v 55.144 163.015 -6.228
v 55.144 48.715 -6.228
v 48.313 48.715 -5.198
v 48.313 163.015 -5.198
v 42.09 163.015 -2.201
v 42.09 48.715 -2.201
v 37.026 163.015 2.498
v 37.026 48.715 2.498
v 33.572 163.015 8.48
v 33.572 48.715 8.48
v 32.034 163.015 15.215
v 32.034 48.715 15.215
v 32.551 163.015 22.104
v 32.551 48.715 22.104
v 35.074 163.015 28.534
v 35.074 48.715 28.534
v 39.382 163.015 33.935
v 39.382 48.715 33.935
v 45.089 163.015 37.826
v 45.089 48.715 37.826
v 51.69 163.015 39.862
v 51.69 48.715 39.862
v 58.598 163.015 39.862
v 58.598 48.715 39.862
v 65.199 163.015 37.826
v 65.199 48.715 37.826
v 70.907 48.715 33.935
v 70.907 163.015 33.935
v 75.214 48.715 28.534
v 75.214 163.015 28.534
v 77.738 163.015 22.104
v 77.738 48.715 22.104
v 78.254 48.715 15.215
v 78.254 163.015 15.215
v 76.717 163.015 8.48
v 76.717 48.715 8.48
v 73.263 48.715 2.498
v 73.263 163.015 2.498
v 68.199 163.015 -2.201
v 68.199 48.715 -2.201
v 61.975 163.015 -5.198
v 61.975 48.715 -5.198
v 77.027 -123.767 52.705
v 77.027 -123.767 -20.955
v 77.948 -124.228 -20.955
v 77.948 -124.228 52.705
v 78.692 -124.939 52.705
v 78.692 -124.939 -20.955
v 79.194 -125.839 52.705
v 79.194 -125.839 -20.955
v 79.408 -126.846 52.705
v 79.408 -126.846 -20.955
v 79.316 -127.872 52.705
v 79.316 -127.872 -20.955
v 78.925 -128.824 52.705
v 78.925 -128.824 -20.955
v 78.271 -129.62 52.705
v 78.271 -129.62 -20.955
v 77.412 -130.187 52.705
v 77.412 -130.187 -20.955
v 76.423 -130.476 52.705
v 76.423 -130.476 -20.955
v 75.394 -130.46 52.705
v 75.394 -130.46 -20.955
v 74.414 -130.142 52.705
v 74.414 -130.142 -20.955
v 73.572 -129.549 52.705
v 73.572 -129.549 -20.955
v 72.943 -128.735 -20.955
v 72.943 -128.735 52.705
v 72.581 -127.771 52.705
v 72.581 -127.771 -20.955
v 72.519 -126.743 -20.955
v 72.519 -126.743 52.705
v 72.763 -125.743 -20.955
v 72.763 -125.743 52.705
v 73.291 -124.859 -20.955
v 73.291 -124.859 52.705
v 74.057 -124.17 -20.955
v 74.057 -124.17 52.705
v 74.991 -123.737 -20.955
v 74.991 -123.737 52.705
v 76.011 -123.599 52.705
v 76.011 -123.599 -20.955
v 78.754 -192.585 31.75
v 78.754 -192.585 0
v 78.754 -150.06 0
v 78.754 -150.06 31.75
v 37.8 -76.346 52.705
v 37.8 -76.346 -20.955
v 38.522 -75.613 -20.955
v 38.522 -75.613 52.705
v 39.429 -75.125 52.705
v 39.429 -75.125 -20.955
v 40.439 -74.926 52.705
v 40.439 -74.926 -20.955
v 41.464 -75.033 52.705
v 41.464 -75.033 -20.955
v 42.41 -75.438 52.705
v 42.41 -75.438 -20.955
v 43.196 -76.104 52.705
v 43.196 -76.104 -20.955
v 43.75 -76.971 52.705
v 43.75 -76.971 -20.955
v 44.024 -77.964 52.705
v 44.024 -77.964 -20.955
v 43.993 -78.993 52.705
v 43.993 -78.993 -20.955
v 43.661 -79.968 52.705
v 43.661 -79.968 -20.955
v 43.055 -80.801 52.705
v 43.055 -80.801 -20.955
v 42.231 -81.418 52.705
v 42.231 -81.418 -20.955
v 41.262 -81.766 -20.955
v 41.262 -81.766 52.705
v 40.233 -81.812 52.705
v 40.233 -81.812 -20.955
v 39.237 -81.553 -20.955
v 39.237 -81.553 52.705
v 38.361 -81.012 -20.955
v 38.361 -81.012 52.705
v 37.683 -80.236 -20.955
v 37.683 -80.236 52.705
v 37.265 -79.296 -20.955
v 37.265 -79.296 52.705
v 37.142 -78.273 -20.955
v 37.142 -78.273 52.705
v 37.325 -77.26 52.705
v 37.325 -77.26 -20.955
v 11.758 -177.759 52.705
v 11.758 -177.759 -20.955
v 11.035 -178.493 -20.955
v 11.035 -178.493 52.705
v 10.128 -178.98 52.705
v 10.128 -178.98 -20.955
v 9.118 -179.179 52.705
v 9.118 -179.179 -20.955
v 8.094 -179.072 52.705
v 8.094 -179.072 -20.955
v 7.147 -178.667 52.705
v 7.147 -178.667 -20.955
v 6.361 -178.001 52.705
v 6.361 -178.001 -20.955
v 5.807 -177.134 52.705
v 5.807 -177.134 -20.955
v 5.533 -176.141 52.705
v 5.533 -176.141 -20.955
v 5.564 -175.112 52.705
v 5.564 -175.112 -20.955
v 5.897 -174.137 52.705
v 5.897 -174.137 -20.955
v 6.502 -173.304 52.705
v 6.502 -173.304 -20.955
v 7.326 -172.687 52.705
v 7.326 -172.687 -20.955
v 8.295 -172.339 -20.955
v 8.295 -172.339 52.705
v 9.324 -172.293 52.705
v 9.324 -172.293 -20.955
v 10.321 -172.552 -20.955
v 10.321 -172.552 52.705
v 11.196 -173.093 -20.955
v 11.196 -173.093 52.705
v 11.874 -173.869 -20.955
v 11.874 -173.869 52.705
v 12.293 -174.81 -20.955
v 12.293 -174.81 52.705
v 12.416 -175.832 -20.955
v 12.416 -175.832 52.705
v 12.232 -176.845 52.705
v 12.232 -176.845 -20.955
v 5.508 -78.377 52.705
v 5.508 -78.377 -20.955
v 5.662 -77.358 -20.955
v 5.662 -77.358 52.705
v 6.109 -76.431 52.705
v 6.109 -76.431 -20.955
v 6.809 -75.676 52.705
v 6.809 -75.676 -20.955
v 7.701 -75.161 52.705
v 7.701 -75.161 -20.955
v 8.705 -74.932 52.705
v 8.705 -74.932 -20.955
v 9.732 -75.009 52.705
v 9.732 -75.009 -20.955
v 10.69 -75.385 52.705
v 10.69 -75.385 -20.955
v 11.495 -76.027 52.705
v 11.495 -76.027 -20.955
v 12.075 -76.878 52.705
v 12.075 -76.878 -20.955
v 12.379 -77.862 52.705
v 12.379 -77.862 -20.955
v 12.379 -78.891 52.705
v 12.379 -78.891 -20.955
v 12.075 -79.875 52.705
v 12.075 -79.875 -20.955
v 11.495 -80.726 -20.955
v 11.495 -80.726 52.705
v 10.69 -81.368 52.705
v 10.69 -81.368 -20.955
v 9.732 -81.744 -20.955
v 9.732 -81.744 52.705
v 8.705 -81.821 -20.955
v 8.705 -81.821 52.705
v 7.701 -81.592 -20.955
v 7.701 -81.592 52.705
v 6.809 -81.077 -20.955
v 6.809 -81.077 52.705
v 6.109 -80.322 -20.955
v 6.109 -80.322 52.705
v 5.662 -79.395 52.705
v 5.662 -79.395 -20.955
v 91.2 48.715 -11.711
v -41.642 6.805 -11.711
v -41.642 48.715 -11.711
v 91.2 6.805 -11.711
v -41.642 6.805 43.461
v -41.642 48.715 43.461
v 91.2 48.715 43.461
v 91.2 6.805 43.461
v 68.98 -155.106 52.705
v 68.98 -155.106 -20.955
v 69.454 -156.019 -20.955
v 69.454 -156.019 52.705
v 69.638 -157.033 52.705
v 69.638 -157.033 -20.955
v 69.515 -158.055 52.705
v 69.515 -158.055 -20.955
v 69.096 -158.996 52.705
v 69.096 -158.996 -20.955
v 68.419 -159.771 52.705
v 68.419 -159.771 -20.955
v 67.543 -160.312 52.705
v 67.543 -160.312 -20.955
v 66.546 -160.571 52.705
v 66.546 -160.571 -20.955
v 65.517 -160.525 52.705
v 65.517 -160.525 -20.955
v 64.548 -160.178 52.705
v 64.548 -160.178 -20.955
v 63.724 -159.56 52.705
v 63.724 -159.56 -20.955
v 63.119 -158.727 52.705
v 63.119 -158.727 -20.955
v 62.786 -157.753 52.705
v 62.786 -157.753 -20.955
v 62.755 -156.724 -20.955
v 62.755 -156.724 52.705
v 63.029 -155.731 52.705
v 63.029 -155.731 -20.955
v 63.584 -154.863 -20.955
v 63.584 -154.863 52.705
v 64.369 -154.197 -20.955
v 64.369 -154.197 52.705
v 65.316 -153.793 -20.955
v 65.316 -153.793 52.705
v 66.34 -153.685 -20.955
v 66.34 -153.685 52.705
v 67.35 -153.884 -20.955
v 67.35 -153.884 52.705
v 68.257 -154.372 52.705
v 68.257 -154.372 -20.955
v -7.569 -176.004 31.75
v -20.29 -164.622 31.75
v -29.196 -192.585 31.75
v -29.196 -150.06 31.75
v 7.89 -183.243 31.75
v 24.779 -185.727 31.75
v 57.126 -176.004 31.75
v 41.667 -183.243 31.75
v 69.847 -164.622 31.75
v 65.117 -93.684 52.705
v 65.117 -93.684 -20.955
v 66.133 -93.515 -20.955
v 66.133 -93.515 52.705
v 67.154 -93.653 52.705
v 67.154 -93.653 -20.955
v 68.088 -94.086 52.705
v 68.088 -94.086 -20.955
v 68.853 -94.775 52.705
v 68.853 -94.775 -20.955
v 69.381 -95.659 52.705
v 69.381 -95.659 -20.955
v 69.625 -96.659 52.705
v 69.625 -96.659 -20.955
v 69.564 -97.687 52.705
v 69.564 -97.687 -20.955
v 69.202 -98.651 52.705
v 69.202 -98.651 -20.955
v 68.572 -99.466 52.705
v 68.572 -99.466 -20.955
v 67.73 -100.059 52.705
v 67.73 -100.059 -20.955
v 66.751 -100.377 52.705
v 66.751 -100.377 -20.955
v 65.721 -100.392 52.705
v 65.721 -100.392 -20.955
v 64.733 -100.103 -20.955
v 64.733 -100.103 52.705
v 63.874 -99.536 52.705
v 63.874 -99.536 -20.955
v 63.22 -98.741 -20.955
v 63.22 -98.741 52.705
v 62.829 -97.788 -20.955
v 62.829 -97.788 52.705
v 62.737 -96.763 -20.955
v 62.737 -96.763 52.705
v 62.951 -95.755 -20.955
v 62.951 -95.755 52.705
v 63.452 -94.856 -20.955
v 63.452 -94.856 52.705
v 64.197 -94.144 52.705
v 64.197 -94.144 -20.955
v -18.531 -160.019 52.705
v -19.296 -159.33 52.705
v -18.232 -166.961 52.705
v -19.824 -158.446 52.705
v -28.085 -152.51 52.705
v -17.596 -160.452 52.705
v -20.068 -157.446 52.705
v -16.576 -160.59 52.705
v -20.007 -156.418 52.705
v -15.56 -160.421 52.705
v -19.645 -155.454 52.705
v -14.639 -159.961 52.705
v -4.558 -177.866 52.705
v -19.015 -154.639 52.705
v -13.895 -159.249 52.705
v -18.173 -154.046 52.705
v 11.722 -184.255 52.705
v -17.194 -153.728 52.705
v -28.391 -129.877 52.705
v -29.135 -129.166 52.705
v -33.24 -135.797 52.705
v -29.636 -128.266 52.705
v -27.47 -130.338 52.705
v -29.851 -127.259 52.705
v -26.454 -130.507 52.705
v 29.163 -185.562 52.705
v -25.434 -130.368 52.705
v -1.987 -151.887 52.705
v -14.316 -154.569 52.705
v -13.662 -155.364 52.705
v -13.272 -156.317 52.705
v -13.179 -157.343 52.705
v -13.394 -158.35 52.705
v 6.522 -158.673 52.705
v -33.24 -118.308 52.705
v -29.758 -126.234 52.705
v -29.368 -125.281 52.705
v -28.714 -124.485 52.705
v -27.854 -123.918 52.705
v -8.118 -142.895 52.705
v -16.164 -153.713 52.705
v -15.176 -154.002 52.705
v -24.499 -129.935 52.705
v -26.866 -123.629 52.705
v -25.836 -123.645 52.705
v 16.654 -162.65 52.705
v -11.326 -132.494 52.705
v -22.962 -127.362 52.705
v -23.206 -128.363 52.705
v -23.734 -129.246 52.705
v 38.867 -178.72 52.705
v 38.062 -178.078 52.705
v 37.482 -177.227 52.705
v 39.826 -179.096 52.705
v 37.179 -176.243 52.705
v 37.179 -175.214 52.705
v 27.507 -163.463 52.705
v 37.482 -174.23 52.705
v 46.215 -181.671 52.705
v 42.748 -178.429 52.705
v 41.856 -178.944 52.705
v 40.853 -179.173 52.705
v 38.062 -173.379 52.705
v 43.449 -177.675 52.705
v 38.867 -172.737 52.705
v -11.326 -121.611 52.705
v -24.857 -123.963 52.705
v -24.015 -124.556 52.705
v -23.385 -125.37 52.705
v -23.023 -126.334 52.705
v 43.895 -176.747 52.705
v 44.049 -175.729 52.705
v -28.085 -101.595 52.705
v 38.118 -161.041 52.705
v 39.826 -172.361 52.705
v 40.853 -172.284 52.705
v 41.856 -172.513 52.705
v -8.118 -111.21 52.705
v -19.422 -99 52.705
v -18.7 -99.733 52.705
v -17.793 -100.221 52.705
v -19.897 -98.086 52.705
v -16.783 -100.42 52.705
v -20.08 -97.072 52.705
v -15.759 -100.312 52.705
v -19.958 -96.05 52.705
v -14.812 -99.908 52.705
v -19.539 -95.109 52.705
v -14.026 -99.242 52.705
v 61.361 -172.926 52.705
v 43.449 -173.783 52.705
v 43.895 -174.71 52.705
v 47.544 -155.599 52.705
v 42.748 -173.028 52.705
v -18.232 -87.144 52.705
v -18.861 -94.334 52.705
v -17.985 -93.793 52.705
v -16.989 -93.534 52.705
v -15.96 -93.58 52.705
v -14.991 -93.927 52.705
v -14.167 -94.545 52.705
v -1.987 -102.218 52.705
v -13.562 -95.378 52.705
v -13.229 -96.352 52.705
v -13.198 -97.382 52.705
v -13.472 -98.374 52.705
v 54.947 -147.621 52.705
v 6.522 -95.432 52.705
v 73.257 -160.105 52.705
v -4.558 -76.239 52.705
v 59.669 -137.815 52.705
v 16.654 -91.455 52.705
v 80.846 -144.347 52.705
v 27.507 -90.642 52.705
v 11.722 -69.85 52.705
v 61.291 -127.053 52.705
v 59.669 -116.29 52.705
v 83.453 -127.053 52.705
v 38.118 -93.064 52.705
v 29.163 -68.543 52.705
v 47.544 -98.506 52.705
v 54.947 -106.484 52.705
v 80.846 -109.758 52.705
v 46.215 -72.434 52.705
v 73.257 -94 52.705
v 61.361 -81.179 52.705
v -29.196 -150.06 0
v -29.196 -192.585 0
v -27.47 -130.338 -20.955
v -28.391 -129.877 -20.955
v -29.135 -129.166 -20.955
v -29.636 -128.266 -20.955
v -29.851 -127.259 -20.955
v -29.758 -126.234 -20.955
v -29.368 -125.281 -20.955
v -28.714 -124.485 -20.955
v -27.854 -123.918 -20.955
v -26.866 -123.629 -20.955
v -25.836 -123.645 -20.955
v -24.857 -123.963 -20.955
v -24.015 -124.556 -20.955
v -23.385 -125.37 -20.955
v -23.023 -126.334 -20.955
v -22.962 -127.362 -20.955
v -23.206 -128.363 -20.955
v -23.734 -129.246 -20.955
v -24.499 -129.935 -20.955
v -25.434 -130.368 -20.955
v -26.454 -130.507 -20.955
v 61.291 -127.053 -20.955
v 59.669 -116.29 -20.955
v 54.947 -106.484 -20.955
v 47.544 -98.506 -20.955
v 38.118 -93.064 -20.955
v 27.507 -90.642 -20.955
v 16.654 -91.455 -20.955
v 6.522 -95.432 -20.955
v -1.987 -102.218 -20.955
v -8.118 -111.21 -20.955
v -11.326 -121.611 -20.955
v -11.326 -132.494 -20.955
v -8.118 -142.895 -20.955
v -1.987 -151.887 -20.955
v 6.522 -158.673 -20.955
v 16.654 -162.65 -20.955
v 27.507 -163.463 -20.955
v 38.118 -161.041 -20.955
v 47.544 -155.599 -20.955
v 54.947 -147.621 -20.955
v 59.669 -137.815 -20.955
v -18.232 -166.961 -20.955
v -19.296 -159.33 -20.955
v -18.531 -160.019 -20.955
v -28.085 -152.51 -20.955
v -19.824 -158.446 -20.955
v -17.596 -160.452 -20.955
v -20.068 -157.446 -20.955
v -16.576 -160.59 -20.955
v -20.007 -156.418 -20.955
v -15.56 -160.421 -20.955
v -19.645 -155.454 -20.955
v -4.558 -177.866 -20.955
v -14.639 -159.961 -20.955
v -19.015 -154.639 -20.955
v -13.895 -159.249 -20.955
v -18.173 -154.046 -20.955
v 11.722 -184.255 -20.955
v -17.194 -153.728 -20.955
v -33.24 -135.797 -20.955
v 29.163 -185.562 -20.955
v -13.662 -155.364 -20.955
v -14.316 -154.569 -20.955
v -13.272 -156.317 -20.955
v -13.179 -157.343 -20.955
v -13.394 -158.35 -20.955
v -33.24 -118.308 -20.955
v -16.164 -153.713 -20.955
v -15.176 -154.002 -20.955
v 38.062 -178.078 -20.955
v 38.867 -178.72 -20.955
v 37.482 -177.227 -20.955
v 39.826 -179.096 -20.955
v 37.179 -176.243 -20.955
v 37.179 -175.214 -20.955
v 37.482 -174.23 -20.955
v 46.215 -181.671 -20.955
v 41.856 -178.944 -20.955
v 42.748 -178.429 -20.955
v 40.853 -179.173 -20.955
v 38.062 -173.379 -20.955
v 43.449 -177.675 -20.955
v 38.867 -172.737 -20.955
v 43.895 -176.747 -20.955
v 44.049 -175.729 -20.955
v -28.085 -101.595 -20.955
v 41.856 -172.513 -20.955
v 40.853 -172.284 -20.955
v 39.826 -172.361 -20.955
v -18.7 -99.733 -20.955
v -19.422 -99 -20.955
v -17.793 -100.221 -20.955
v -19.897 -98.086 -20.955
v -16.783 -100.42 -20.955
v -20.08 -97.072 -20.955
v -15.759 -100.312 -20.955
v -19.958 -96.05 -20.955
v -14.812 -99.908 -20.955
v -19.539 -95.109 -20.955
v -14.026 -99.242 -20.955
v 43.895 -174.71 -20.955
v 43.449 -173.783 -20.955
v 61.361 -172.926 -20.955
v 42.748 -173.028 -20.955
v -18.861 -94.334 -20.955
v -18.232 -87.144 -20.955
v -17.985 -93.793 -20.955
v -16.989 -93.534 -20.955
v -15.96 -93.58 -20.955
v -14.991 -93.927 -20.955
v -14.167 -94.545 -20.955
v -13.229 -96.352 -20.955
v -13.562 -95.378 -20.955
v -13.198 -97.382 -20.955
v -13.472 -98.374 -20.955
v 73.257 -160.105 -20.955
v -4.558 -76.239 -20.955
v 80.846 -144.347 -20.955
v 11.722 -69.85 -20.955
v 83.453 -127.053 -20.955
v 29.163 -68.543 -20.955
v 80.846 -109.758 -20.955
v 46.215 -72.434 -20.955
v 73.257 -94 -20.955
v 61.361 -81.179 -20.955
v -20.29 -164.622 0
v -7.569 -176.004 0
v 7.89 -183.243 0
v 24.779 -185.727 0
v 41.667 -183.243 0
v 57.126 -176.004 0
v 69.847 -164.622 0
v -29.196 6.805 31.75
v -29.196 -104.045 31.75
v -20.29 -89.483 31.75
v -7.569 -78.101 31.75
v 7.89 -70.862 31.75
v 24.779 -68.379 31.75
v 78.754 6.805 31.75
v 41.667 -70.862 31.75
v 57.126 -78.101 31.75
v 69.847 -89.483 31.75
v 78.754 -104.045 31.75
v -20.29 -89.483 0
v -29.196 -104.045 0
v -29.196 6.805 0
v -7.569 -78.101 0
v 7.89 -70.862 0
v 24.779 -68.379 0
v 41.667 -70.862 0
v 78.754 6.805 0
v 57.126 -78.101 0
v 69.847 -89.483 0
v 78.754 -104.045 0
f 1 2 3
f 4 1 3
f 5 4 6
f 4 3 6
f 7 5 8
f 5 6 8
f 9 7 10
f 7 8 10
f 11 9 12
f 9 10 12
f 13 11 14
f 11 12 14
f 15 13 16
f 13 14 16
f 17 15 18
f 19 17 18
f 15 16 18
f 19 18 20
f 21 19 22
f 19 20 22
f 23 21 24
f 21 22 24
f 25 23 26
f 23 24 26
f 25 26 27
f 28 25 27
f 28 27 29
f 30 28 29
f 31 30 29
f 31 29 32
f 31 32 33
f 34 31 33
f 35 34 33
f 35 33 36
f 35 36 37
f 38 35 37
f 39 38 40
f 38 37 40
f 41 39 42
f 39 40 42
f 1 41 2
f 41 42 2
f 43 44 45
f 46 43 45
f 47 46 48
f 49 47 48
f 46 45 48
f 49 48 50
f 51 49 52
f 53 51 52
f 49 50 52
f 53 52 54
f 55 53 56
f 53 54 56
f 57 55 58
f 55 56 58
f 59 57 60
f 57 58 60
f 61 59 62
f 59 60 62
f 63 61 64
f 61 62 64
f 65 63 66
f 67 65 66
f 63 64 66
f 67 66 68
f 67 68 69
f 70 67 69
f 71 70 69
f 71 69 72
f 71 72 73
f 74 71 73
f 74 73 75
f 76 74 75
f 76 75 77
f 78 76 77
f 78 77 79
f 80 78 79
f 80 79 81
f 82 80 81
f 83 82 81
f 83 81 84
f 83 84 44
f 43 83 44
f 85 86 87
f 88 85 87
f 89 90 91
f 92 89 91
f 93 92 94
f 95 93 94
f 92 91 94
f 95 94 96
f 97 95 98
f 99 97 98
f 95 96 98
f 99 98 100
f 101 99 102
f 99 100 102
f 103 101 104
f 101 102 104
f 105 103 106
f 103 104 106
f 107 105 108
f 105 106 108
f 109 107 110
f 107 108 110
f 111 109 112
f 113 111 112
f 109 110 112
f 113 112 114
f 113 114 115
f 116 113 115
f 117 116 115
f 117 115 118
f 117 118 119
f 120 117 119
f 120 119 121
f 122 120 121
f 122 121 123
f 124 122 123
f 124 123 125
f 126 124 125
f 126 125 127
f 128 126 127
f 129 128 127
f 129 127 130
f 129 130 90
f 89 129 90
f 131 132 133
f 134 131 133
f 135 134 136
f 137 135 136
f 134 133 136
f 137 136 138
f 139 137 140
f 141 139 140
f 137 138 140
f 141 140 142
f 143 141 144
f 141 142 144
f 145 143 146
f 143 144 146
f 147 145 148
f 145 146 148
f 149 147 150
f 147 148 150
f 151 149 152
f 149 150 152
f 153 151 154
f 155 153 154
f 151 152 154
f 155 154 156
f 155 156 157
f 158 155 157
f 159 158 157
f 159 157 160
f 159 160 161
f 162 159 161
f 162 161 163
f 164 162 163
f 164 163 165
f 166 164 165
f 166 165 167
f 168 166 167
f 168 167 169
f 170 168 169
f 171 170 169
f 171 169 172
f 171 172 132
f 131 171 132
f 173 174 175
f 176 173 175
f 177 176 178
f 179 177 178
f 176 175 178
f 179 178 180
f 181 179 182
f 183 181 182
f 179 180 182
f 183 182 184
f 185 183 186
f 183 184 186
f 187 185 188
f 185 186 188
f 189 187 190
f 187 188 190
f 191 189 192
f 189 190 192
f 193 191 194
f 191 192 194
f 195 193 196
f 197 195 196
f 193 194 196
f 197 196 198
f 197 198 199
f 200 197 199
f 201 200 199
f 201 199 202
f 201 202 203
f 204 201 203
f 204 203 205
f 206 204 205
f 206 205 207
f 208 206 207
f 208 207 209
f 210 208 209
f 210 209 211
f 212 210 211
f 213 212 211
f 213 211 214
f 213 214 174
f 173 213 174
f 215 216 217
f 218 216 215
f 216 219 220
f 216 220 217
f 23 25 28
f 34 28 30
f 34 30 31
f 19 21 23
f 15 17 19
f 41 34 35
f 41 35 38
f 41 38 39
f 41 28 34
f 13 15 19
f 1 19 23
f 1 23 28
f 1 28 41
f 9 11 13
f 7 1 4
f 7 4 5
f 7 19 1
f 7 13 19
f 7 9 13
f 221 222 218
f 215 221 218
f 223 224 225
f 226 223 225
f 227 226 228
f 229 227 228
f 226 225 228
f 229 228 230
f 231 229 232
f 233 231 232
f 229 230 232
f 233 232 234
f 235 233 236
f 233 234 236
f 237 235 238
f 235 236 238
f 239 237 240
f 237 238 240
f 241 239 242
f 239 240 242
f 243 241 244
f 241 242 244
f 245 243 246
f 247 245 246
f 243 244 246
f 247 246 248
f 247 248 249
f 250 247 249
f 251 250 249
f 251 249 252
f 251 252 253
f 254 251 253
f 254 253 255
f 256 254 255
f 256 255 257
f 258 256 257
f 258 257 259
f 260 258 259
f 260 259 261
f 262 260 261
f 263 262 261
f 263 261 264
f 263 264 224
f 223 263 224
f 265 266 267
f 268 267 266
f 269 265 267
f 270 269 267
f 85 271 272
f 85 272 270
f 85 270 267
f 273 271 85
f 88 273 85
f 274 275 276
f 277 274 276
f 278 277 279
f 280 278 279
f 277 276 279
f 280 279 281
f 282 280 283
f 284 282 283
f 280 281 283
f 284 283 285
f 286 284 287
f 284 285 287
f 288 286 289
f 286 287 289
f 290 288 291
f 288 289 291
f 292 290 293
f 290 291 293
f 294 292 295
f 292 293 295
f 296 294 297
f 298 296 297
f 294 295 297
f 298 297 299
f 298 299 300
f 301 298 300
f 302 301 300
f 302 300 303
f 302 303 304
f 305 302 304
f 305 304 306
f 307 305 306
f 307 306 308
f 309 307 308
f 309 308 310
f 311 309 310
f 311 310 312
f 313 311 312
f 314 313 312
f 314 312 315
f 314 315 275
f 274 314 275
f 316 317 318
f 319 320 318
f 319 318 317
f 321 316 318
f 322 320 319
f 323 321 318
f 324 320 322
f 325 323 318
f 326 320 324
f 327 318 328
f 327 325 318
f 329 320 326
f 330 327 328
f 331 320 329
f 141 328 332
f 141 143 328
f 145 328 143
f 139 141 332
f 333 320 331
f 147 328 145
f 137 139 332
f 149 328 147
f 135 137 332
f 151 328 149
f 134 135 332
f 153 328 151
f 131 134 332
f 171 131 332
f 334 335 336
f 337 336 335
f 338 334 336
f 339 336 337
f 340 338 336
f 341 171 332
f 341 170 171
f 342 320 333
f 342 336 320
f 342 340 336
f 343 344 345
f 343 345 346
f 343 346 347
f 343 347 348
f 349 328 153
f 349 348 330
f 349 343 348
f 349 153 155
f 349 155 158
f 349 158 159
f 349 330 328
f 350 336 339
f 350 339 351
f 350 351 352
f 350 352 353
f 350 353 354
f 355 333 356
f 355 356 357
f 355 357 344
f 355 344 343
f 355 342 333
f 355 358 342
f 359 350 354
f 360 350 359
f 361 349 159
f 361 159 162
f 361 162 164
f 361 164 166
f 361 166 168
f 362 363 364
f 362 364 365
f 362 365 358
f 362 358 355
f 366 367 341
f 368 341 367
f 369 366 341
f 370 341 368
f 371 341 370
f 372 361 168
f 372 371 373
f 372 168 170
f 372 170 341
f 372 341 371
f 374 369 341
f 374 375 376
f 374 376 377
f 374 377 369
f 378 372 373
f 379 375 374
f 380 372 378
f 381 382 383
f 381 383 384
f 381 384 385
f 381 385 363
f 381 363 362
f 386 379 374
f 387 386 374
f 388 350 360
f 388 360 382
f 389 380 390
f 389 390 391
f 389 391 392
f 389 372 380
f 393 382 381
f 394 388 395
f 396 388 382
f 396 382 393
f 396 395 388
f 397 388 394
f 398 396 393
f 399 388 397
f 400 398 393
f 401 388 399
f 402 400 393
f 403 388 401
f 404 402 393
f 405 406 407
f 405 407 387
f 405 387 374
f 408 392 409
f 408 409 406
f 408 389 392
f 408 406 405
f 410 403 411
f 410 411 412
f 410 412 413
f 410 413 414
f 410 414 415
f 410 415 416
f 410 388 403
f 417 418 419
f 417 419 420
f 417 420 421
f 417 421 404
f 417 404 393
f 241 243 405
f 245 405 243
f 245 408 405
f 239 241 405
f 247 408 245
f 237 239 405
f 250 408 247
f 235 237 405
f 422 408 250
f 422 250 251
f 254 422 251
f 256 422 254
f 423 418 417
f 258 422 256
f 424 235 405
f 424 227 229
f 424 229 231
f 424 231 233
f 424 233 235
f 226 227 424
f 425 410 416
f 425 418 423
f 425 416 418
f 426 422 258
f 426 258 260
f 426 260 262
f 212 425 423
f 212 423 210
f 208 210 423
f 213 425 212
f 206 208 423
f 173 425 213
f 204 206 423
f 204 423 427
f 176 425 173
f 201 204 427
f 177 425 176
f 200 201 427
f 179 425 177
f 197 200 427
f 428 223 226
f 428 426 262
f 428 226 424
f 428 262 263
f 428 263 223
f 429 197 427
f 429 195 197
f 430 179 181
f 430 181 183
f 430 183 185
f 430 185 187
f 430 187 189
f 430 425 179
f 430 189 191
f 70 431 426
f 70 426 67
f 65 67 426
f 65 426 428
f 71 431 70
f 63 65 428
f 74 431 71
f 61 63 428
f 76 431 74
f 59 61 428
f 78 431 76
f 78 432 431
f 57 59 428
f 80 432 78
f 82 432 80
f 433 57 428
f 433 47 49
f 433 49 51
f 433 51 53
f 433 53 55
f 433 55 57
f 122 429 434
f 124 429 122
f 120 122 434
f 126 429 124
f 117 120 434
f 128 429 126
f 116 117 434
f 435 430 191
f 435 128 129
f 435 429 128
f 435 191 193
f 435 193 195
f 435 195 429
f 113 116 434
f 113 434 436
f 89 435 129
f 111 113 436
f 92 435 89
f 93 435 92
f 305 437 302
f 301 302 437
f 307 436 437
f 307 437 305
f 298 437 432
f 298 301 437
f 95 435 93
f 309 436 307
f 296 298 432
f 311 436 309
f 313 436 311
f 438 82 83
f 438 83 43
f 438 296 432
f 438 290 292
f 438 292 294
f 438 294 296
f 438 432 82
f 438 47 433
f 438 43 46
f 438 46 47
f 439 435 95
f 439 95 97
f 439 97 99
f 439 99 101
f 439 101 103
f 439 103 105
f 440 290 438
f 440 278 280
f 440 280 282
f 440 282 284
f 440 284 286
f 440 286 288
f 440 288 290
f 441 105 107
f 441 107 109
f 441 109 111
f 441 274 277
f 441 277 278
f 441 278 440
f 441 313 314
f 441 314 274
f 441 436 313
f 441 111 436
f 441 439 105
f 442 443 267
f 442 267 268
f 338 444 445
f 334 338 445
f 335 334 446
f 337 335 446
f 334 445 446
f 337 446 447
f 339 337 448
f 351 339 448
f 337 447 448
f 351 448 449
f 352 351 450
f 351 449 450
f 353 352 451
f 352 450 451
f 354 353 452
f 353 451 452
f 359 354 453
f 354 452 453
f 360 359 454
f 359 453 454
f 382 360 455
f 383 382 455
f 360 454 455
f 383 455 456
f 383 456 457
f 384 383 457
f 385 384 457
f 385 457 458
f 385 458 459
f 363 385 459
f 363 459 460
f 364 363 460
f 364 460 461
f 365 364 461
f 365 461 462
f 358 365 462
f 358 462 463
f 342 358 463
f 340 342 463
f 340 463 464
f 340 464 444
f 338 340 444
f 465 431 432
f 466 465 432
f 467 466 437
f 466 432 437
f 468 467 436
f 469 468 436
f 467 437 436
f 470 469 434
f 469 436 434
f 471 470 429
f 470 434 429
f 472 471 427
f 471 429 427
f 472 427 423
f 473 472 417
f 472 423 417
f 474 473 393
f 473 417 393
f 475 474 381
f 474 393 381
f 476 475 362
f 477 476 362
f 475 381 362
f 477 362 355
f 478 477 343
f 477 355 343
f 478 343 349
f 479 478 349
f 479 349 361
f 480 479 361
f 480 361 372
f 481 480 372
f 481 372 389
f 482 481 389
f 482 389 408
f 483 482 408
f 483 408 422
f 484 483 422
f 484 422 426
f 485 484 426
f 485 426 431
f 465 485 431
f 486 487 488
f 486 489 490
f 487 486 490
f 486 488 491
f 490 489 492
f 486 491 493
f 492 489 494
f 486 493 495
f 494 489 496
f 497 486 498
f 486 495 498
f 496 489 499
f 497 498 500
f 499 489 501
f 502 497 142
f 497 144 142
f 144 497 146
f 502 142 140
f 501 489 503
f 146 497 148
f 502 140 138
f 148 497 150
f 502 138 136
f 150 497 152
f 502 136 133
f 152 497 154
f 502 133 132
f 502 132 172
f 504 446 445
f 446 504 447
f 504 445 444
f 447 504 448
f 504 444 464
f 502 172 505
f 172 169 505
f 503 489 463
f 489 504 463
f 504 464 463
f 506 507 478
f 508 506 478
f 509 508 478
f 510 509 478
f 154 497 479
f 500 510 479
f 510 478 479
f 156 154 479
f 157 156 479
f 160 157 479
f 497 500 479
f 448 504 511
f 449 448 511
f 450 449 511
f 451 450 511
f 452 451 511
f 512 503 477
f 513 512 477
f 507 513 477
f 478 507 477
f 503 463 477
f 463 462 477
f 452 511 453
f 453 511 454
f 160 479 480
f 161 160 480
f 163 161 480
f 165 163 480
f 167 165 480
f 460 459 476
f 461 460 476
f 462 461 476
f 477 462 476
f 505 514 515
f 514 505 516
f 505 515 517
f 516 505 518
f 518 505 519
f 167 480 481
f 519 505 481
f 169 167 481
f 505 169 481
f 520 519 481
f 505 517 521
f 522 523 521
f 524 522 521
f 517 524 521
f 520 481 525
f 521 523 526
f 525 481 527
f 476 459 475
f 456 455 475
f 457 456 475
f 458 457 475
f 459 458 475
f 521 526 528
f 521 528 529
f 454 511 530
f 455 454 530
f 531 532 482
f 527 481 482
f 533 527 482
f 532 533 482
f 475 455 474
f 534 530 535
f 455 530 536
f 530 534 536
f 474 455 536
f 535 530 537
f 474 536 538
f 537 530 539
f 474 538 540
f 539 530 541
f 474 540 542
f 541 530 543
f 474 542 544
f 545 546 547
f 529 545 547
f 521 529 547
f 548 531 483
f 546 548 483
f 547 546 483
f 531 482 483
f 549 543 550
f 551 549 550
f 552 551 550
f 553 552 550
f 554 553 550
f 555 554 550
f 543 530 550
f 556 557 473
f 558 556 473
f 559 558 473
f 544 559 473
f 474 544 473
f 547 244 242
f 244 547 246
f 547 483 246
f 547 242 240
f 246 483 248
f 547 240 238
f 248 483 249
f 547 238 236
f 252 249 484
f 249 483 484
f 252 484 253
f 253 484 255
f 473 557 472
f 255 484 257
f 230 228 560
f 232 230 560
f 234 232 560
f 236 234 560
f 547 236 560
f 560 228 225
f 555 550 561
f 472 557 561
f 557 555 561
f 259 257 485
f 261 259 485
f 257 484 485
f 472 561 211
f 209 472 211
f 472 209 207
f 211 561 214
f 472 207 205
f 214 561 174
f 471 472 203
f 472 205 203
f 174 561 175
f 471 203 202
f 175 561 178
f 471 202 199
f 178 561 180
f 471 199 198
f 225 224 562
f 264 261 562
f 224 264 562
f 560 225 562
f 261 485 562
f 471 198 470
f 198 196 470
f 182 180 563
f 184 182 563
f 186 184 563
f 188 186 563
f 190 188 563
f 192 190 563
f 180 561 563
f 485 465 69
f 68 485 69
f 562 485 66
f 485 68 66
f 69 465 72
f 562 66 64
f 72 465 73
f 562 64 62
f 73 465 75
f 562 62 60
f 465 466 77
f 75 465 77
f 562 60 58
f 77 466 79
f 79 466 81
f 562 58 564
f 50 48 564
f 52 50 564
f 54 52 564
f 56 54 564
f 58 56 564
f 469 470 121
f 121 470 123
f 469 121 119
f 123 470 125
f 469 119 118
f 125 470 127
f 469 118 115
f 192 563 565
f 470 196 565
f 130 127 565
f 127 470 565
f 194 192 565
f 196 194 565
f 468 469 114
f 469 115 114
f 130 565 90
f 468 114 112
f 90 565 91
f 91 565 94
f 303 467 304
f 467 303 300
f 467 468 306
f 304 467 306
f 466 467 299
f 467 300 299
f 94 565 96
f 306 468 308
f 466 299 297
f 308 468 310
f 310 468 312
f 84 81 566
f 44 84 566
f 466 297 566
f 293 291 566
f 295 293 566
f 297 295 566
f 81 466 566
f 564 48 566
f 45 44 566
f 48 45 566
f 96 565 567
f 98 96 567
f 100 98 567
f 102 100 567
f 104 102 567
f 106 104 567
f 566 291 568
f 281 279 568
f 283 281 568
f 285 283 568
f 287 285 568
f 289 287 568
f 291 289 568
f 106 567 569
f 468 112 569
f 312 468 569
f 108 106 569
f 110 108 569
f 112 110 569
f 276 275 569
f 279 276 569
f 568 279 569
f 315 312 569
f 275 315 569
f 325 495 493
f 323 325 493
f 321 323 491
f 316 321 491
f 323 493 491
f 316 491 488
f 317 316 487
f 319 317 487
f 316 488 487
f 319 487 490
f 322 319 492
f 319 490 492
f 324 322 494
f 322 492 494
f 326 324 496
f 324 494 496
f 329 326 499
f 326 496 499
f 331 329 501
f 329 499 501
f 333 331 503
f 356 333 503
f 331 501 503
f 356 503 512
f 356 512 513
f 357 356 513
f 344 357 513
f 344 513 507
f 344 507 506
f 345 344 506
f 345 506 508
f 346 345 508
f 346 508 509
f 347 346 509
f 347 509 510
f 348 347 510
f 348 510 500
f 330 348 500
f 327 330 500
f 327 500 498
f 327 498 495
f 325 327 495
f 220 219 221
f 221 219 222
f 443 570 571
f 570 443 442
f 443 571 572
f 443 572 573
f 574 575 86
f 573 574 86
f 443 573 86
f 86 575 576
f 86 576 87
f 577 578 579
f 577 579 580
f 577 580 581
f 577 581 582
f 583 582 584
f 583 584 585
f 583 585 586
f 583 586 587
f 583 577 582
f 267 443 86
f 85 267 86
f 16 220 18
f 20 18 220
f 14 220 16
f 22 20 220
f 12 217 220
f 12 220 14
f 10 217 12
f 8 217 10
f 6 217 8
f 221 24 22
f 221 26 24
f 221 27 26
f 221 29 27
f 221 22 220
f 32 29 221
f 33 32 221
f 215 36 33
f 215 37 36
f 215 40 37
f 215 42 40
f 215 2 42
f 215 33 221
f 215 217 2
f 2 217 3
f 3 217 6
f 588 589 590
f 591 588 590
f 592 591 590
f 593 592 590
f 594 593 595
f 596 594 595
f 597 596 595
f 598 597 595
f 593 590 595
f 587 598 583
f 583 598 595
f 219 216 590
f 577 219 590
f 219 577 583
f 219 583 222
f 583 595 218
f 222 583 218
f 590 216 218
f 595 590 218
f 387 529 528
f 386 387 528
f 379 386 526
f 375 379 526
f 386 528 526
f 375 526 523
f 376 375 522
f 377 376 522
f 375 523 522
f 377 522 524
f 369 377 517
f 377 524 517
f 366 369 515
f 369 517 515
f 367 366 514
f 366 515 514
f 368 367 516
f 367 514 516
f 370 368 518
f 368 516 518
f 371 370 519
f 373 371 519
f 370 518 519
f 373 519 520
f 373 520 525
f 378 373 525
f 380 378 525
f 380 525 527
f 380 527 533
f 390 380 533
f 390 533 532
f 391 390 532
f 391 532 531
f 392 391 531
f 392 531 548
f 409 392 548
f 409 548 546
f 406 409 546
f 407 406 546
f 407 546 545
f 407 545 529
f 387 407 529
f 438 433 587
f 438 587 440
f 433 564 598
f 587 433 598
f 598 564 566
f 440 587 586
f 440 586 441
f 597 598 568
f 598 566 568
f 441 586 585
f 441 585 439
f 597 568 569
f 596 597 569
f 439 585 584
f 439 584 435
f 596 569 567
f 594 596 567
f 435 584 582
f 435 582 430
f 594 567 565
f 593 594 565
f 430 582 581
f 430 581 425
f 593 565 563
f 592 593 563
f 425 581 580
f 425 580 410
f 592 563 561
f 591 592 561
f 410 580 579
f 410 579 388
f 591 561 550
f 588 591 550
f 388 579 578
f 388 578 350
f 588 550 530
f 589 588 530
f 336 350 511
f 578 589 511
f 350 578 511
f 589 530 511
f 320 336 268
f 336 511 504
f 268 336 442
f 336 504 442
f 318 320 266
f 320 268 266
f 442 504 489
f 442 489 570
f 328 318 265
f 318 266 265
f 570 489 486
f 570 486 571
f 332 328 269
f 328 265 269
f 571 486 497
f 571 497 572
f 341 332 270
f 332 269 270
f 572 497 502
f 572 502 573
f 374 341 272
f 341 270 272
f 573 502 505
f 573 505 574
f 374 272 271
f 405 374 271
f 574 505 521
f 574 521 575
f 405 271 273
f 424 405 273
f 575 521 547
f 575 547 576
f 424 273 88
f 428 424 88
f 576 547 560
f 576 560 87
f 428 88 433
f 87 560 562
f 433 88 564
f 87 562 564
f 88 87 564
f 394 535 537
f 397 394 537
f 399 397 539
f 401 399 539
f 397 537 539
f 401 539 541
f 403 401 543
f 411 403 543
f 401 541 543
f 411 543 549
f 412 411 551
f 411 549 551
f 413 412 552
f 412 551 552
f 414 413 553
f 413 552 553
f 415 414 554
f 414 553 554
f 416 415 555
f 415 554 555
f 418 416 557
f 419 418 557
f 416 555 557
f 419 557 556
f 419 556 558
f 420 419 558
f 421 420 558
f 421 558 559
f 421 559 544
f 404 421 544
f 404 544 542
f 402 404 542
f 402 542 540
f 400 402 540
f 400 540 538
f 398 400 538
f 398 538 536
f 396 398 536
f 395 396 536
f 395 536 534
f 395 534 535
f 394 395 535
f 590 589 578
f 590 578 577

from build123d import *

# Parameters (mm, degrees)
SKETCH1_W                = 107.95
SKETCH1_H                = 220.345
EXTRUDE1_DEPTH           = 31.75
EXTRUDE2_DEPTH           = 20.955
EXTRUDE2_DEPTH_BACK      = 52.705
SKETCH2_R                = 58.674
SKETCH3_R                = 36.5125
EXTRUDE3_DEPTH           = 223.438643032
F_5_16_24_TAPPED_HOLE1_D = 6.9088
CIRPATTERN1_COUNT        = 10
EXTRUDE4_DEPTH           = 20.955
EXTRUDE4_DEPTH_BACK      = 20.955
SKETCH7_W                = 132.842
SKETCH7_H                = 55.172869126
SKETCH8_R                = 23.174591889
EXTRUDE5_DEPTH           = 114.3


with BuildPart() as part:
    # Sketch1 → Extrude1 (new body)
    with BuildSketch(Plane.XY):
        with Locations((24.778661236, -82.412046749)):
            Rectangle(SKETCH1_W, SKETCH1_H)
    extrude(amount=EXTRUDE1_DEPTH)

    # Sketch2 → Extrude2 (add, two sides: drawn at the far end of the back side and taken through both)
    with BuildSketch(Plane.XY.offset(31.75).offset(-EXTRUDE2_DEPTH_BACK)):
        with Locations((24.778661236, -127.052546749)):
            Circle(SKETCH2_R)
    extrude(amount=EXTRUDE2_DEPTH + EXTRUDE2_DEPTH_BACK)

    # Sketch3 → Extrude3 (cut, through all)
    with BuildSketch(Plane.XY.offset(52.705)):
        with Locations((24.778661236, -127.052546749)):
            Circle(SKETCH3_R)
    extrude(amount=-EXTRUDE3_DEPTH, mode=Mode.SUBTRACT)

    # 5/16-24 Tapped Hole1 (through all)
    with Locations(Plane.XY.offset(52.705)):
        with Locations((8.962862447, -78.376523189)):
            f_5_16_24_tapped_hole1 = Hole(F_5_16_24_TAPPED_HOLE1_D / 2)

    # CirPattern1: 5/16-24 Tapped Hole1 ×10 about axis
    cirpattern1_axis = Axis((24.778661236, -127.052546749, 0), (0, 0, 1))
    for i in range(1, CIRPATTERN1_COUNT):
        add(f_5_16_24_tapped_hole1.rotate(cirpattern1_axis, i * 360 / CIRPATTERN1_COUNT), mode=Mode.SUBTRACT)

    # Sketch7 → Extrude4 (add, two sides: drawn at the far end of the back side and taken through both)
    with BuildSketch(Plane(origin=(0, 27.760453251, 0), x_dir=(1, 0, 0), z_dir=(0, 1, 0)).offset(-EXTRUDE4_DEPTH_BACK)):
        with Locations((24.778661236, -15.875)):
            Rectangle(SKETCH7_W, SKETCH7_H)
    extrude(amount=EXTRUDE4_DEPTH + EXTRUDE4_DEPTH_BACK)

    # Sketch8 → Extrude5 (add)
    with BuildSketch(Plane(origin=(0, 48.715453251, 0), x_dir=(1, 0, 0), z_dir=(0, 1, 0))):
        with Locations(Location((55.144248721, -16.946726617, 0), (0, 0, 90))):
            Circle(SKETCH8_R)
    extrude(amount=EXTRUDE5_DEPTH)


solid = part.part
